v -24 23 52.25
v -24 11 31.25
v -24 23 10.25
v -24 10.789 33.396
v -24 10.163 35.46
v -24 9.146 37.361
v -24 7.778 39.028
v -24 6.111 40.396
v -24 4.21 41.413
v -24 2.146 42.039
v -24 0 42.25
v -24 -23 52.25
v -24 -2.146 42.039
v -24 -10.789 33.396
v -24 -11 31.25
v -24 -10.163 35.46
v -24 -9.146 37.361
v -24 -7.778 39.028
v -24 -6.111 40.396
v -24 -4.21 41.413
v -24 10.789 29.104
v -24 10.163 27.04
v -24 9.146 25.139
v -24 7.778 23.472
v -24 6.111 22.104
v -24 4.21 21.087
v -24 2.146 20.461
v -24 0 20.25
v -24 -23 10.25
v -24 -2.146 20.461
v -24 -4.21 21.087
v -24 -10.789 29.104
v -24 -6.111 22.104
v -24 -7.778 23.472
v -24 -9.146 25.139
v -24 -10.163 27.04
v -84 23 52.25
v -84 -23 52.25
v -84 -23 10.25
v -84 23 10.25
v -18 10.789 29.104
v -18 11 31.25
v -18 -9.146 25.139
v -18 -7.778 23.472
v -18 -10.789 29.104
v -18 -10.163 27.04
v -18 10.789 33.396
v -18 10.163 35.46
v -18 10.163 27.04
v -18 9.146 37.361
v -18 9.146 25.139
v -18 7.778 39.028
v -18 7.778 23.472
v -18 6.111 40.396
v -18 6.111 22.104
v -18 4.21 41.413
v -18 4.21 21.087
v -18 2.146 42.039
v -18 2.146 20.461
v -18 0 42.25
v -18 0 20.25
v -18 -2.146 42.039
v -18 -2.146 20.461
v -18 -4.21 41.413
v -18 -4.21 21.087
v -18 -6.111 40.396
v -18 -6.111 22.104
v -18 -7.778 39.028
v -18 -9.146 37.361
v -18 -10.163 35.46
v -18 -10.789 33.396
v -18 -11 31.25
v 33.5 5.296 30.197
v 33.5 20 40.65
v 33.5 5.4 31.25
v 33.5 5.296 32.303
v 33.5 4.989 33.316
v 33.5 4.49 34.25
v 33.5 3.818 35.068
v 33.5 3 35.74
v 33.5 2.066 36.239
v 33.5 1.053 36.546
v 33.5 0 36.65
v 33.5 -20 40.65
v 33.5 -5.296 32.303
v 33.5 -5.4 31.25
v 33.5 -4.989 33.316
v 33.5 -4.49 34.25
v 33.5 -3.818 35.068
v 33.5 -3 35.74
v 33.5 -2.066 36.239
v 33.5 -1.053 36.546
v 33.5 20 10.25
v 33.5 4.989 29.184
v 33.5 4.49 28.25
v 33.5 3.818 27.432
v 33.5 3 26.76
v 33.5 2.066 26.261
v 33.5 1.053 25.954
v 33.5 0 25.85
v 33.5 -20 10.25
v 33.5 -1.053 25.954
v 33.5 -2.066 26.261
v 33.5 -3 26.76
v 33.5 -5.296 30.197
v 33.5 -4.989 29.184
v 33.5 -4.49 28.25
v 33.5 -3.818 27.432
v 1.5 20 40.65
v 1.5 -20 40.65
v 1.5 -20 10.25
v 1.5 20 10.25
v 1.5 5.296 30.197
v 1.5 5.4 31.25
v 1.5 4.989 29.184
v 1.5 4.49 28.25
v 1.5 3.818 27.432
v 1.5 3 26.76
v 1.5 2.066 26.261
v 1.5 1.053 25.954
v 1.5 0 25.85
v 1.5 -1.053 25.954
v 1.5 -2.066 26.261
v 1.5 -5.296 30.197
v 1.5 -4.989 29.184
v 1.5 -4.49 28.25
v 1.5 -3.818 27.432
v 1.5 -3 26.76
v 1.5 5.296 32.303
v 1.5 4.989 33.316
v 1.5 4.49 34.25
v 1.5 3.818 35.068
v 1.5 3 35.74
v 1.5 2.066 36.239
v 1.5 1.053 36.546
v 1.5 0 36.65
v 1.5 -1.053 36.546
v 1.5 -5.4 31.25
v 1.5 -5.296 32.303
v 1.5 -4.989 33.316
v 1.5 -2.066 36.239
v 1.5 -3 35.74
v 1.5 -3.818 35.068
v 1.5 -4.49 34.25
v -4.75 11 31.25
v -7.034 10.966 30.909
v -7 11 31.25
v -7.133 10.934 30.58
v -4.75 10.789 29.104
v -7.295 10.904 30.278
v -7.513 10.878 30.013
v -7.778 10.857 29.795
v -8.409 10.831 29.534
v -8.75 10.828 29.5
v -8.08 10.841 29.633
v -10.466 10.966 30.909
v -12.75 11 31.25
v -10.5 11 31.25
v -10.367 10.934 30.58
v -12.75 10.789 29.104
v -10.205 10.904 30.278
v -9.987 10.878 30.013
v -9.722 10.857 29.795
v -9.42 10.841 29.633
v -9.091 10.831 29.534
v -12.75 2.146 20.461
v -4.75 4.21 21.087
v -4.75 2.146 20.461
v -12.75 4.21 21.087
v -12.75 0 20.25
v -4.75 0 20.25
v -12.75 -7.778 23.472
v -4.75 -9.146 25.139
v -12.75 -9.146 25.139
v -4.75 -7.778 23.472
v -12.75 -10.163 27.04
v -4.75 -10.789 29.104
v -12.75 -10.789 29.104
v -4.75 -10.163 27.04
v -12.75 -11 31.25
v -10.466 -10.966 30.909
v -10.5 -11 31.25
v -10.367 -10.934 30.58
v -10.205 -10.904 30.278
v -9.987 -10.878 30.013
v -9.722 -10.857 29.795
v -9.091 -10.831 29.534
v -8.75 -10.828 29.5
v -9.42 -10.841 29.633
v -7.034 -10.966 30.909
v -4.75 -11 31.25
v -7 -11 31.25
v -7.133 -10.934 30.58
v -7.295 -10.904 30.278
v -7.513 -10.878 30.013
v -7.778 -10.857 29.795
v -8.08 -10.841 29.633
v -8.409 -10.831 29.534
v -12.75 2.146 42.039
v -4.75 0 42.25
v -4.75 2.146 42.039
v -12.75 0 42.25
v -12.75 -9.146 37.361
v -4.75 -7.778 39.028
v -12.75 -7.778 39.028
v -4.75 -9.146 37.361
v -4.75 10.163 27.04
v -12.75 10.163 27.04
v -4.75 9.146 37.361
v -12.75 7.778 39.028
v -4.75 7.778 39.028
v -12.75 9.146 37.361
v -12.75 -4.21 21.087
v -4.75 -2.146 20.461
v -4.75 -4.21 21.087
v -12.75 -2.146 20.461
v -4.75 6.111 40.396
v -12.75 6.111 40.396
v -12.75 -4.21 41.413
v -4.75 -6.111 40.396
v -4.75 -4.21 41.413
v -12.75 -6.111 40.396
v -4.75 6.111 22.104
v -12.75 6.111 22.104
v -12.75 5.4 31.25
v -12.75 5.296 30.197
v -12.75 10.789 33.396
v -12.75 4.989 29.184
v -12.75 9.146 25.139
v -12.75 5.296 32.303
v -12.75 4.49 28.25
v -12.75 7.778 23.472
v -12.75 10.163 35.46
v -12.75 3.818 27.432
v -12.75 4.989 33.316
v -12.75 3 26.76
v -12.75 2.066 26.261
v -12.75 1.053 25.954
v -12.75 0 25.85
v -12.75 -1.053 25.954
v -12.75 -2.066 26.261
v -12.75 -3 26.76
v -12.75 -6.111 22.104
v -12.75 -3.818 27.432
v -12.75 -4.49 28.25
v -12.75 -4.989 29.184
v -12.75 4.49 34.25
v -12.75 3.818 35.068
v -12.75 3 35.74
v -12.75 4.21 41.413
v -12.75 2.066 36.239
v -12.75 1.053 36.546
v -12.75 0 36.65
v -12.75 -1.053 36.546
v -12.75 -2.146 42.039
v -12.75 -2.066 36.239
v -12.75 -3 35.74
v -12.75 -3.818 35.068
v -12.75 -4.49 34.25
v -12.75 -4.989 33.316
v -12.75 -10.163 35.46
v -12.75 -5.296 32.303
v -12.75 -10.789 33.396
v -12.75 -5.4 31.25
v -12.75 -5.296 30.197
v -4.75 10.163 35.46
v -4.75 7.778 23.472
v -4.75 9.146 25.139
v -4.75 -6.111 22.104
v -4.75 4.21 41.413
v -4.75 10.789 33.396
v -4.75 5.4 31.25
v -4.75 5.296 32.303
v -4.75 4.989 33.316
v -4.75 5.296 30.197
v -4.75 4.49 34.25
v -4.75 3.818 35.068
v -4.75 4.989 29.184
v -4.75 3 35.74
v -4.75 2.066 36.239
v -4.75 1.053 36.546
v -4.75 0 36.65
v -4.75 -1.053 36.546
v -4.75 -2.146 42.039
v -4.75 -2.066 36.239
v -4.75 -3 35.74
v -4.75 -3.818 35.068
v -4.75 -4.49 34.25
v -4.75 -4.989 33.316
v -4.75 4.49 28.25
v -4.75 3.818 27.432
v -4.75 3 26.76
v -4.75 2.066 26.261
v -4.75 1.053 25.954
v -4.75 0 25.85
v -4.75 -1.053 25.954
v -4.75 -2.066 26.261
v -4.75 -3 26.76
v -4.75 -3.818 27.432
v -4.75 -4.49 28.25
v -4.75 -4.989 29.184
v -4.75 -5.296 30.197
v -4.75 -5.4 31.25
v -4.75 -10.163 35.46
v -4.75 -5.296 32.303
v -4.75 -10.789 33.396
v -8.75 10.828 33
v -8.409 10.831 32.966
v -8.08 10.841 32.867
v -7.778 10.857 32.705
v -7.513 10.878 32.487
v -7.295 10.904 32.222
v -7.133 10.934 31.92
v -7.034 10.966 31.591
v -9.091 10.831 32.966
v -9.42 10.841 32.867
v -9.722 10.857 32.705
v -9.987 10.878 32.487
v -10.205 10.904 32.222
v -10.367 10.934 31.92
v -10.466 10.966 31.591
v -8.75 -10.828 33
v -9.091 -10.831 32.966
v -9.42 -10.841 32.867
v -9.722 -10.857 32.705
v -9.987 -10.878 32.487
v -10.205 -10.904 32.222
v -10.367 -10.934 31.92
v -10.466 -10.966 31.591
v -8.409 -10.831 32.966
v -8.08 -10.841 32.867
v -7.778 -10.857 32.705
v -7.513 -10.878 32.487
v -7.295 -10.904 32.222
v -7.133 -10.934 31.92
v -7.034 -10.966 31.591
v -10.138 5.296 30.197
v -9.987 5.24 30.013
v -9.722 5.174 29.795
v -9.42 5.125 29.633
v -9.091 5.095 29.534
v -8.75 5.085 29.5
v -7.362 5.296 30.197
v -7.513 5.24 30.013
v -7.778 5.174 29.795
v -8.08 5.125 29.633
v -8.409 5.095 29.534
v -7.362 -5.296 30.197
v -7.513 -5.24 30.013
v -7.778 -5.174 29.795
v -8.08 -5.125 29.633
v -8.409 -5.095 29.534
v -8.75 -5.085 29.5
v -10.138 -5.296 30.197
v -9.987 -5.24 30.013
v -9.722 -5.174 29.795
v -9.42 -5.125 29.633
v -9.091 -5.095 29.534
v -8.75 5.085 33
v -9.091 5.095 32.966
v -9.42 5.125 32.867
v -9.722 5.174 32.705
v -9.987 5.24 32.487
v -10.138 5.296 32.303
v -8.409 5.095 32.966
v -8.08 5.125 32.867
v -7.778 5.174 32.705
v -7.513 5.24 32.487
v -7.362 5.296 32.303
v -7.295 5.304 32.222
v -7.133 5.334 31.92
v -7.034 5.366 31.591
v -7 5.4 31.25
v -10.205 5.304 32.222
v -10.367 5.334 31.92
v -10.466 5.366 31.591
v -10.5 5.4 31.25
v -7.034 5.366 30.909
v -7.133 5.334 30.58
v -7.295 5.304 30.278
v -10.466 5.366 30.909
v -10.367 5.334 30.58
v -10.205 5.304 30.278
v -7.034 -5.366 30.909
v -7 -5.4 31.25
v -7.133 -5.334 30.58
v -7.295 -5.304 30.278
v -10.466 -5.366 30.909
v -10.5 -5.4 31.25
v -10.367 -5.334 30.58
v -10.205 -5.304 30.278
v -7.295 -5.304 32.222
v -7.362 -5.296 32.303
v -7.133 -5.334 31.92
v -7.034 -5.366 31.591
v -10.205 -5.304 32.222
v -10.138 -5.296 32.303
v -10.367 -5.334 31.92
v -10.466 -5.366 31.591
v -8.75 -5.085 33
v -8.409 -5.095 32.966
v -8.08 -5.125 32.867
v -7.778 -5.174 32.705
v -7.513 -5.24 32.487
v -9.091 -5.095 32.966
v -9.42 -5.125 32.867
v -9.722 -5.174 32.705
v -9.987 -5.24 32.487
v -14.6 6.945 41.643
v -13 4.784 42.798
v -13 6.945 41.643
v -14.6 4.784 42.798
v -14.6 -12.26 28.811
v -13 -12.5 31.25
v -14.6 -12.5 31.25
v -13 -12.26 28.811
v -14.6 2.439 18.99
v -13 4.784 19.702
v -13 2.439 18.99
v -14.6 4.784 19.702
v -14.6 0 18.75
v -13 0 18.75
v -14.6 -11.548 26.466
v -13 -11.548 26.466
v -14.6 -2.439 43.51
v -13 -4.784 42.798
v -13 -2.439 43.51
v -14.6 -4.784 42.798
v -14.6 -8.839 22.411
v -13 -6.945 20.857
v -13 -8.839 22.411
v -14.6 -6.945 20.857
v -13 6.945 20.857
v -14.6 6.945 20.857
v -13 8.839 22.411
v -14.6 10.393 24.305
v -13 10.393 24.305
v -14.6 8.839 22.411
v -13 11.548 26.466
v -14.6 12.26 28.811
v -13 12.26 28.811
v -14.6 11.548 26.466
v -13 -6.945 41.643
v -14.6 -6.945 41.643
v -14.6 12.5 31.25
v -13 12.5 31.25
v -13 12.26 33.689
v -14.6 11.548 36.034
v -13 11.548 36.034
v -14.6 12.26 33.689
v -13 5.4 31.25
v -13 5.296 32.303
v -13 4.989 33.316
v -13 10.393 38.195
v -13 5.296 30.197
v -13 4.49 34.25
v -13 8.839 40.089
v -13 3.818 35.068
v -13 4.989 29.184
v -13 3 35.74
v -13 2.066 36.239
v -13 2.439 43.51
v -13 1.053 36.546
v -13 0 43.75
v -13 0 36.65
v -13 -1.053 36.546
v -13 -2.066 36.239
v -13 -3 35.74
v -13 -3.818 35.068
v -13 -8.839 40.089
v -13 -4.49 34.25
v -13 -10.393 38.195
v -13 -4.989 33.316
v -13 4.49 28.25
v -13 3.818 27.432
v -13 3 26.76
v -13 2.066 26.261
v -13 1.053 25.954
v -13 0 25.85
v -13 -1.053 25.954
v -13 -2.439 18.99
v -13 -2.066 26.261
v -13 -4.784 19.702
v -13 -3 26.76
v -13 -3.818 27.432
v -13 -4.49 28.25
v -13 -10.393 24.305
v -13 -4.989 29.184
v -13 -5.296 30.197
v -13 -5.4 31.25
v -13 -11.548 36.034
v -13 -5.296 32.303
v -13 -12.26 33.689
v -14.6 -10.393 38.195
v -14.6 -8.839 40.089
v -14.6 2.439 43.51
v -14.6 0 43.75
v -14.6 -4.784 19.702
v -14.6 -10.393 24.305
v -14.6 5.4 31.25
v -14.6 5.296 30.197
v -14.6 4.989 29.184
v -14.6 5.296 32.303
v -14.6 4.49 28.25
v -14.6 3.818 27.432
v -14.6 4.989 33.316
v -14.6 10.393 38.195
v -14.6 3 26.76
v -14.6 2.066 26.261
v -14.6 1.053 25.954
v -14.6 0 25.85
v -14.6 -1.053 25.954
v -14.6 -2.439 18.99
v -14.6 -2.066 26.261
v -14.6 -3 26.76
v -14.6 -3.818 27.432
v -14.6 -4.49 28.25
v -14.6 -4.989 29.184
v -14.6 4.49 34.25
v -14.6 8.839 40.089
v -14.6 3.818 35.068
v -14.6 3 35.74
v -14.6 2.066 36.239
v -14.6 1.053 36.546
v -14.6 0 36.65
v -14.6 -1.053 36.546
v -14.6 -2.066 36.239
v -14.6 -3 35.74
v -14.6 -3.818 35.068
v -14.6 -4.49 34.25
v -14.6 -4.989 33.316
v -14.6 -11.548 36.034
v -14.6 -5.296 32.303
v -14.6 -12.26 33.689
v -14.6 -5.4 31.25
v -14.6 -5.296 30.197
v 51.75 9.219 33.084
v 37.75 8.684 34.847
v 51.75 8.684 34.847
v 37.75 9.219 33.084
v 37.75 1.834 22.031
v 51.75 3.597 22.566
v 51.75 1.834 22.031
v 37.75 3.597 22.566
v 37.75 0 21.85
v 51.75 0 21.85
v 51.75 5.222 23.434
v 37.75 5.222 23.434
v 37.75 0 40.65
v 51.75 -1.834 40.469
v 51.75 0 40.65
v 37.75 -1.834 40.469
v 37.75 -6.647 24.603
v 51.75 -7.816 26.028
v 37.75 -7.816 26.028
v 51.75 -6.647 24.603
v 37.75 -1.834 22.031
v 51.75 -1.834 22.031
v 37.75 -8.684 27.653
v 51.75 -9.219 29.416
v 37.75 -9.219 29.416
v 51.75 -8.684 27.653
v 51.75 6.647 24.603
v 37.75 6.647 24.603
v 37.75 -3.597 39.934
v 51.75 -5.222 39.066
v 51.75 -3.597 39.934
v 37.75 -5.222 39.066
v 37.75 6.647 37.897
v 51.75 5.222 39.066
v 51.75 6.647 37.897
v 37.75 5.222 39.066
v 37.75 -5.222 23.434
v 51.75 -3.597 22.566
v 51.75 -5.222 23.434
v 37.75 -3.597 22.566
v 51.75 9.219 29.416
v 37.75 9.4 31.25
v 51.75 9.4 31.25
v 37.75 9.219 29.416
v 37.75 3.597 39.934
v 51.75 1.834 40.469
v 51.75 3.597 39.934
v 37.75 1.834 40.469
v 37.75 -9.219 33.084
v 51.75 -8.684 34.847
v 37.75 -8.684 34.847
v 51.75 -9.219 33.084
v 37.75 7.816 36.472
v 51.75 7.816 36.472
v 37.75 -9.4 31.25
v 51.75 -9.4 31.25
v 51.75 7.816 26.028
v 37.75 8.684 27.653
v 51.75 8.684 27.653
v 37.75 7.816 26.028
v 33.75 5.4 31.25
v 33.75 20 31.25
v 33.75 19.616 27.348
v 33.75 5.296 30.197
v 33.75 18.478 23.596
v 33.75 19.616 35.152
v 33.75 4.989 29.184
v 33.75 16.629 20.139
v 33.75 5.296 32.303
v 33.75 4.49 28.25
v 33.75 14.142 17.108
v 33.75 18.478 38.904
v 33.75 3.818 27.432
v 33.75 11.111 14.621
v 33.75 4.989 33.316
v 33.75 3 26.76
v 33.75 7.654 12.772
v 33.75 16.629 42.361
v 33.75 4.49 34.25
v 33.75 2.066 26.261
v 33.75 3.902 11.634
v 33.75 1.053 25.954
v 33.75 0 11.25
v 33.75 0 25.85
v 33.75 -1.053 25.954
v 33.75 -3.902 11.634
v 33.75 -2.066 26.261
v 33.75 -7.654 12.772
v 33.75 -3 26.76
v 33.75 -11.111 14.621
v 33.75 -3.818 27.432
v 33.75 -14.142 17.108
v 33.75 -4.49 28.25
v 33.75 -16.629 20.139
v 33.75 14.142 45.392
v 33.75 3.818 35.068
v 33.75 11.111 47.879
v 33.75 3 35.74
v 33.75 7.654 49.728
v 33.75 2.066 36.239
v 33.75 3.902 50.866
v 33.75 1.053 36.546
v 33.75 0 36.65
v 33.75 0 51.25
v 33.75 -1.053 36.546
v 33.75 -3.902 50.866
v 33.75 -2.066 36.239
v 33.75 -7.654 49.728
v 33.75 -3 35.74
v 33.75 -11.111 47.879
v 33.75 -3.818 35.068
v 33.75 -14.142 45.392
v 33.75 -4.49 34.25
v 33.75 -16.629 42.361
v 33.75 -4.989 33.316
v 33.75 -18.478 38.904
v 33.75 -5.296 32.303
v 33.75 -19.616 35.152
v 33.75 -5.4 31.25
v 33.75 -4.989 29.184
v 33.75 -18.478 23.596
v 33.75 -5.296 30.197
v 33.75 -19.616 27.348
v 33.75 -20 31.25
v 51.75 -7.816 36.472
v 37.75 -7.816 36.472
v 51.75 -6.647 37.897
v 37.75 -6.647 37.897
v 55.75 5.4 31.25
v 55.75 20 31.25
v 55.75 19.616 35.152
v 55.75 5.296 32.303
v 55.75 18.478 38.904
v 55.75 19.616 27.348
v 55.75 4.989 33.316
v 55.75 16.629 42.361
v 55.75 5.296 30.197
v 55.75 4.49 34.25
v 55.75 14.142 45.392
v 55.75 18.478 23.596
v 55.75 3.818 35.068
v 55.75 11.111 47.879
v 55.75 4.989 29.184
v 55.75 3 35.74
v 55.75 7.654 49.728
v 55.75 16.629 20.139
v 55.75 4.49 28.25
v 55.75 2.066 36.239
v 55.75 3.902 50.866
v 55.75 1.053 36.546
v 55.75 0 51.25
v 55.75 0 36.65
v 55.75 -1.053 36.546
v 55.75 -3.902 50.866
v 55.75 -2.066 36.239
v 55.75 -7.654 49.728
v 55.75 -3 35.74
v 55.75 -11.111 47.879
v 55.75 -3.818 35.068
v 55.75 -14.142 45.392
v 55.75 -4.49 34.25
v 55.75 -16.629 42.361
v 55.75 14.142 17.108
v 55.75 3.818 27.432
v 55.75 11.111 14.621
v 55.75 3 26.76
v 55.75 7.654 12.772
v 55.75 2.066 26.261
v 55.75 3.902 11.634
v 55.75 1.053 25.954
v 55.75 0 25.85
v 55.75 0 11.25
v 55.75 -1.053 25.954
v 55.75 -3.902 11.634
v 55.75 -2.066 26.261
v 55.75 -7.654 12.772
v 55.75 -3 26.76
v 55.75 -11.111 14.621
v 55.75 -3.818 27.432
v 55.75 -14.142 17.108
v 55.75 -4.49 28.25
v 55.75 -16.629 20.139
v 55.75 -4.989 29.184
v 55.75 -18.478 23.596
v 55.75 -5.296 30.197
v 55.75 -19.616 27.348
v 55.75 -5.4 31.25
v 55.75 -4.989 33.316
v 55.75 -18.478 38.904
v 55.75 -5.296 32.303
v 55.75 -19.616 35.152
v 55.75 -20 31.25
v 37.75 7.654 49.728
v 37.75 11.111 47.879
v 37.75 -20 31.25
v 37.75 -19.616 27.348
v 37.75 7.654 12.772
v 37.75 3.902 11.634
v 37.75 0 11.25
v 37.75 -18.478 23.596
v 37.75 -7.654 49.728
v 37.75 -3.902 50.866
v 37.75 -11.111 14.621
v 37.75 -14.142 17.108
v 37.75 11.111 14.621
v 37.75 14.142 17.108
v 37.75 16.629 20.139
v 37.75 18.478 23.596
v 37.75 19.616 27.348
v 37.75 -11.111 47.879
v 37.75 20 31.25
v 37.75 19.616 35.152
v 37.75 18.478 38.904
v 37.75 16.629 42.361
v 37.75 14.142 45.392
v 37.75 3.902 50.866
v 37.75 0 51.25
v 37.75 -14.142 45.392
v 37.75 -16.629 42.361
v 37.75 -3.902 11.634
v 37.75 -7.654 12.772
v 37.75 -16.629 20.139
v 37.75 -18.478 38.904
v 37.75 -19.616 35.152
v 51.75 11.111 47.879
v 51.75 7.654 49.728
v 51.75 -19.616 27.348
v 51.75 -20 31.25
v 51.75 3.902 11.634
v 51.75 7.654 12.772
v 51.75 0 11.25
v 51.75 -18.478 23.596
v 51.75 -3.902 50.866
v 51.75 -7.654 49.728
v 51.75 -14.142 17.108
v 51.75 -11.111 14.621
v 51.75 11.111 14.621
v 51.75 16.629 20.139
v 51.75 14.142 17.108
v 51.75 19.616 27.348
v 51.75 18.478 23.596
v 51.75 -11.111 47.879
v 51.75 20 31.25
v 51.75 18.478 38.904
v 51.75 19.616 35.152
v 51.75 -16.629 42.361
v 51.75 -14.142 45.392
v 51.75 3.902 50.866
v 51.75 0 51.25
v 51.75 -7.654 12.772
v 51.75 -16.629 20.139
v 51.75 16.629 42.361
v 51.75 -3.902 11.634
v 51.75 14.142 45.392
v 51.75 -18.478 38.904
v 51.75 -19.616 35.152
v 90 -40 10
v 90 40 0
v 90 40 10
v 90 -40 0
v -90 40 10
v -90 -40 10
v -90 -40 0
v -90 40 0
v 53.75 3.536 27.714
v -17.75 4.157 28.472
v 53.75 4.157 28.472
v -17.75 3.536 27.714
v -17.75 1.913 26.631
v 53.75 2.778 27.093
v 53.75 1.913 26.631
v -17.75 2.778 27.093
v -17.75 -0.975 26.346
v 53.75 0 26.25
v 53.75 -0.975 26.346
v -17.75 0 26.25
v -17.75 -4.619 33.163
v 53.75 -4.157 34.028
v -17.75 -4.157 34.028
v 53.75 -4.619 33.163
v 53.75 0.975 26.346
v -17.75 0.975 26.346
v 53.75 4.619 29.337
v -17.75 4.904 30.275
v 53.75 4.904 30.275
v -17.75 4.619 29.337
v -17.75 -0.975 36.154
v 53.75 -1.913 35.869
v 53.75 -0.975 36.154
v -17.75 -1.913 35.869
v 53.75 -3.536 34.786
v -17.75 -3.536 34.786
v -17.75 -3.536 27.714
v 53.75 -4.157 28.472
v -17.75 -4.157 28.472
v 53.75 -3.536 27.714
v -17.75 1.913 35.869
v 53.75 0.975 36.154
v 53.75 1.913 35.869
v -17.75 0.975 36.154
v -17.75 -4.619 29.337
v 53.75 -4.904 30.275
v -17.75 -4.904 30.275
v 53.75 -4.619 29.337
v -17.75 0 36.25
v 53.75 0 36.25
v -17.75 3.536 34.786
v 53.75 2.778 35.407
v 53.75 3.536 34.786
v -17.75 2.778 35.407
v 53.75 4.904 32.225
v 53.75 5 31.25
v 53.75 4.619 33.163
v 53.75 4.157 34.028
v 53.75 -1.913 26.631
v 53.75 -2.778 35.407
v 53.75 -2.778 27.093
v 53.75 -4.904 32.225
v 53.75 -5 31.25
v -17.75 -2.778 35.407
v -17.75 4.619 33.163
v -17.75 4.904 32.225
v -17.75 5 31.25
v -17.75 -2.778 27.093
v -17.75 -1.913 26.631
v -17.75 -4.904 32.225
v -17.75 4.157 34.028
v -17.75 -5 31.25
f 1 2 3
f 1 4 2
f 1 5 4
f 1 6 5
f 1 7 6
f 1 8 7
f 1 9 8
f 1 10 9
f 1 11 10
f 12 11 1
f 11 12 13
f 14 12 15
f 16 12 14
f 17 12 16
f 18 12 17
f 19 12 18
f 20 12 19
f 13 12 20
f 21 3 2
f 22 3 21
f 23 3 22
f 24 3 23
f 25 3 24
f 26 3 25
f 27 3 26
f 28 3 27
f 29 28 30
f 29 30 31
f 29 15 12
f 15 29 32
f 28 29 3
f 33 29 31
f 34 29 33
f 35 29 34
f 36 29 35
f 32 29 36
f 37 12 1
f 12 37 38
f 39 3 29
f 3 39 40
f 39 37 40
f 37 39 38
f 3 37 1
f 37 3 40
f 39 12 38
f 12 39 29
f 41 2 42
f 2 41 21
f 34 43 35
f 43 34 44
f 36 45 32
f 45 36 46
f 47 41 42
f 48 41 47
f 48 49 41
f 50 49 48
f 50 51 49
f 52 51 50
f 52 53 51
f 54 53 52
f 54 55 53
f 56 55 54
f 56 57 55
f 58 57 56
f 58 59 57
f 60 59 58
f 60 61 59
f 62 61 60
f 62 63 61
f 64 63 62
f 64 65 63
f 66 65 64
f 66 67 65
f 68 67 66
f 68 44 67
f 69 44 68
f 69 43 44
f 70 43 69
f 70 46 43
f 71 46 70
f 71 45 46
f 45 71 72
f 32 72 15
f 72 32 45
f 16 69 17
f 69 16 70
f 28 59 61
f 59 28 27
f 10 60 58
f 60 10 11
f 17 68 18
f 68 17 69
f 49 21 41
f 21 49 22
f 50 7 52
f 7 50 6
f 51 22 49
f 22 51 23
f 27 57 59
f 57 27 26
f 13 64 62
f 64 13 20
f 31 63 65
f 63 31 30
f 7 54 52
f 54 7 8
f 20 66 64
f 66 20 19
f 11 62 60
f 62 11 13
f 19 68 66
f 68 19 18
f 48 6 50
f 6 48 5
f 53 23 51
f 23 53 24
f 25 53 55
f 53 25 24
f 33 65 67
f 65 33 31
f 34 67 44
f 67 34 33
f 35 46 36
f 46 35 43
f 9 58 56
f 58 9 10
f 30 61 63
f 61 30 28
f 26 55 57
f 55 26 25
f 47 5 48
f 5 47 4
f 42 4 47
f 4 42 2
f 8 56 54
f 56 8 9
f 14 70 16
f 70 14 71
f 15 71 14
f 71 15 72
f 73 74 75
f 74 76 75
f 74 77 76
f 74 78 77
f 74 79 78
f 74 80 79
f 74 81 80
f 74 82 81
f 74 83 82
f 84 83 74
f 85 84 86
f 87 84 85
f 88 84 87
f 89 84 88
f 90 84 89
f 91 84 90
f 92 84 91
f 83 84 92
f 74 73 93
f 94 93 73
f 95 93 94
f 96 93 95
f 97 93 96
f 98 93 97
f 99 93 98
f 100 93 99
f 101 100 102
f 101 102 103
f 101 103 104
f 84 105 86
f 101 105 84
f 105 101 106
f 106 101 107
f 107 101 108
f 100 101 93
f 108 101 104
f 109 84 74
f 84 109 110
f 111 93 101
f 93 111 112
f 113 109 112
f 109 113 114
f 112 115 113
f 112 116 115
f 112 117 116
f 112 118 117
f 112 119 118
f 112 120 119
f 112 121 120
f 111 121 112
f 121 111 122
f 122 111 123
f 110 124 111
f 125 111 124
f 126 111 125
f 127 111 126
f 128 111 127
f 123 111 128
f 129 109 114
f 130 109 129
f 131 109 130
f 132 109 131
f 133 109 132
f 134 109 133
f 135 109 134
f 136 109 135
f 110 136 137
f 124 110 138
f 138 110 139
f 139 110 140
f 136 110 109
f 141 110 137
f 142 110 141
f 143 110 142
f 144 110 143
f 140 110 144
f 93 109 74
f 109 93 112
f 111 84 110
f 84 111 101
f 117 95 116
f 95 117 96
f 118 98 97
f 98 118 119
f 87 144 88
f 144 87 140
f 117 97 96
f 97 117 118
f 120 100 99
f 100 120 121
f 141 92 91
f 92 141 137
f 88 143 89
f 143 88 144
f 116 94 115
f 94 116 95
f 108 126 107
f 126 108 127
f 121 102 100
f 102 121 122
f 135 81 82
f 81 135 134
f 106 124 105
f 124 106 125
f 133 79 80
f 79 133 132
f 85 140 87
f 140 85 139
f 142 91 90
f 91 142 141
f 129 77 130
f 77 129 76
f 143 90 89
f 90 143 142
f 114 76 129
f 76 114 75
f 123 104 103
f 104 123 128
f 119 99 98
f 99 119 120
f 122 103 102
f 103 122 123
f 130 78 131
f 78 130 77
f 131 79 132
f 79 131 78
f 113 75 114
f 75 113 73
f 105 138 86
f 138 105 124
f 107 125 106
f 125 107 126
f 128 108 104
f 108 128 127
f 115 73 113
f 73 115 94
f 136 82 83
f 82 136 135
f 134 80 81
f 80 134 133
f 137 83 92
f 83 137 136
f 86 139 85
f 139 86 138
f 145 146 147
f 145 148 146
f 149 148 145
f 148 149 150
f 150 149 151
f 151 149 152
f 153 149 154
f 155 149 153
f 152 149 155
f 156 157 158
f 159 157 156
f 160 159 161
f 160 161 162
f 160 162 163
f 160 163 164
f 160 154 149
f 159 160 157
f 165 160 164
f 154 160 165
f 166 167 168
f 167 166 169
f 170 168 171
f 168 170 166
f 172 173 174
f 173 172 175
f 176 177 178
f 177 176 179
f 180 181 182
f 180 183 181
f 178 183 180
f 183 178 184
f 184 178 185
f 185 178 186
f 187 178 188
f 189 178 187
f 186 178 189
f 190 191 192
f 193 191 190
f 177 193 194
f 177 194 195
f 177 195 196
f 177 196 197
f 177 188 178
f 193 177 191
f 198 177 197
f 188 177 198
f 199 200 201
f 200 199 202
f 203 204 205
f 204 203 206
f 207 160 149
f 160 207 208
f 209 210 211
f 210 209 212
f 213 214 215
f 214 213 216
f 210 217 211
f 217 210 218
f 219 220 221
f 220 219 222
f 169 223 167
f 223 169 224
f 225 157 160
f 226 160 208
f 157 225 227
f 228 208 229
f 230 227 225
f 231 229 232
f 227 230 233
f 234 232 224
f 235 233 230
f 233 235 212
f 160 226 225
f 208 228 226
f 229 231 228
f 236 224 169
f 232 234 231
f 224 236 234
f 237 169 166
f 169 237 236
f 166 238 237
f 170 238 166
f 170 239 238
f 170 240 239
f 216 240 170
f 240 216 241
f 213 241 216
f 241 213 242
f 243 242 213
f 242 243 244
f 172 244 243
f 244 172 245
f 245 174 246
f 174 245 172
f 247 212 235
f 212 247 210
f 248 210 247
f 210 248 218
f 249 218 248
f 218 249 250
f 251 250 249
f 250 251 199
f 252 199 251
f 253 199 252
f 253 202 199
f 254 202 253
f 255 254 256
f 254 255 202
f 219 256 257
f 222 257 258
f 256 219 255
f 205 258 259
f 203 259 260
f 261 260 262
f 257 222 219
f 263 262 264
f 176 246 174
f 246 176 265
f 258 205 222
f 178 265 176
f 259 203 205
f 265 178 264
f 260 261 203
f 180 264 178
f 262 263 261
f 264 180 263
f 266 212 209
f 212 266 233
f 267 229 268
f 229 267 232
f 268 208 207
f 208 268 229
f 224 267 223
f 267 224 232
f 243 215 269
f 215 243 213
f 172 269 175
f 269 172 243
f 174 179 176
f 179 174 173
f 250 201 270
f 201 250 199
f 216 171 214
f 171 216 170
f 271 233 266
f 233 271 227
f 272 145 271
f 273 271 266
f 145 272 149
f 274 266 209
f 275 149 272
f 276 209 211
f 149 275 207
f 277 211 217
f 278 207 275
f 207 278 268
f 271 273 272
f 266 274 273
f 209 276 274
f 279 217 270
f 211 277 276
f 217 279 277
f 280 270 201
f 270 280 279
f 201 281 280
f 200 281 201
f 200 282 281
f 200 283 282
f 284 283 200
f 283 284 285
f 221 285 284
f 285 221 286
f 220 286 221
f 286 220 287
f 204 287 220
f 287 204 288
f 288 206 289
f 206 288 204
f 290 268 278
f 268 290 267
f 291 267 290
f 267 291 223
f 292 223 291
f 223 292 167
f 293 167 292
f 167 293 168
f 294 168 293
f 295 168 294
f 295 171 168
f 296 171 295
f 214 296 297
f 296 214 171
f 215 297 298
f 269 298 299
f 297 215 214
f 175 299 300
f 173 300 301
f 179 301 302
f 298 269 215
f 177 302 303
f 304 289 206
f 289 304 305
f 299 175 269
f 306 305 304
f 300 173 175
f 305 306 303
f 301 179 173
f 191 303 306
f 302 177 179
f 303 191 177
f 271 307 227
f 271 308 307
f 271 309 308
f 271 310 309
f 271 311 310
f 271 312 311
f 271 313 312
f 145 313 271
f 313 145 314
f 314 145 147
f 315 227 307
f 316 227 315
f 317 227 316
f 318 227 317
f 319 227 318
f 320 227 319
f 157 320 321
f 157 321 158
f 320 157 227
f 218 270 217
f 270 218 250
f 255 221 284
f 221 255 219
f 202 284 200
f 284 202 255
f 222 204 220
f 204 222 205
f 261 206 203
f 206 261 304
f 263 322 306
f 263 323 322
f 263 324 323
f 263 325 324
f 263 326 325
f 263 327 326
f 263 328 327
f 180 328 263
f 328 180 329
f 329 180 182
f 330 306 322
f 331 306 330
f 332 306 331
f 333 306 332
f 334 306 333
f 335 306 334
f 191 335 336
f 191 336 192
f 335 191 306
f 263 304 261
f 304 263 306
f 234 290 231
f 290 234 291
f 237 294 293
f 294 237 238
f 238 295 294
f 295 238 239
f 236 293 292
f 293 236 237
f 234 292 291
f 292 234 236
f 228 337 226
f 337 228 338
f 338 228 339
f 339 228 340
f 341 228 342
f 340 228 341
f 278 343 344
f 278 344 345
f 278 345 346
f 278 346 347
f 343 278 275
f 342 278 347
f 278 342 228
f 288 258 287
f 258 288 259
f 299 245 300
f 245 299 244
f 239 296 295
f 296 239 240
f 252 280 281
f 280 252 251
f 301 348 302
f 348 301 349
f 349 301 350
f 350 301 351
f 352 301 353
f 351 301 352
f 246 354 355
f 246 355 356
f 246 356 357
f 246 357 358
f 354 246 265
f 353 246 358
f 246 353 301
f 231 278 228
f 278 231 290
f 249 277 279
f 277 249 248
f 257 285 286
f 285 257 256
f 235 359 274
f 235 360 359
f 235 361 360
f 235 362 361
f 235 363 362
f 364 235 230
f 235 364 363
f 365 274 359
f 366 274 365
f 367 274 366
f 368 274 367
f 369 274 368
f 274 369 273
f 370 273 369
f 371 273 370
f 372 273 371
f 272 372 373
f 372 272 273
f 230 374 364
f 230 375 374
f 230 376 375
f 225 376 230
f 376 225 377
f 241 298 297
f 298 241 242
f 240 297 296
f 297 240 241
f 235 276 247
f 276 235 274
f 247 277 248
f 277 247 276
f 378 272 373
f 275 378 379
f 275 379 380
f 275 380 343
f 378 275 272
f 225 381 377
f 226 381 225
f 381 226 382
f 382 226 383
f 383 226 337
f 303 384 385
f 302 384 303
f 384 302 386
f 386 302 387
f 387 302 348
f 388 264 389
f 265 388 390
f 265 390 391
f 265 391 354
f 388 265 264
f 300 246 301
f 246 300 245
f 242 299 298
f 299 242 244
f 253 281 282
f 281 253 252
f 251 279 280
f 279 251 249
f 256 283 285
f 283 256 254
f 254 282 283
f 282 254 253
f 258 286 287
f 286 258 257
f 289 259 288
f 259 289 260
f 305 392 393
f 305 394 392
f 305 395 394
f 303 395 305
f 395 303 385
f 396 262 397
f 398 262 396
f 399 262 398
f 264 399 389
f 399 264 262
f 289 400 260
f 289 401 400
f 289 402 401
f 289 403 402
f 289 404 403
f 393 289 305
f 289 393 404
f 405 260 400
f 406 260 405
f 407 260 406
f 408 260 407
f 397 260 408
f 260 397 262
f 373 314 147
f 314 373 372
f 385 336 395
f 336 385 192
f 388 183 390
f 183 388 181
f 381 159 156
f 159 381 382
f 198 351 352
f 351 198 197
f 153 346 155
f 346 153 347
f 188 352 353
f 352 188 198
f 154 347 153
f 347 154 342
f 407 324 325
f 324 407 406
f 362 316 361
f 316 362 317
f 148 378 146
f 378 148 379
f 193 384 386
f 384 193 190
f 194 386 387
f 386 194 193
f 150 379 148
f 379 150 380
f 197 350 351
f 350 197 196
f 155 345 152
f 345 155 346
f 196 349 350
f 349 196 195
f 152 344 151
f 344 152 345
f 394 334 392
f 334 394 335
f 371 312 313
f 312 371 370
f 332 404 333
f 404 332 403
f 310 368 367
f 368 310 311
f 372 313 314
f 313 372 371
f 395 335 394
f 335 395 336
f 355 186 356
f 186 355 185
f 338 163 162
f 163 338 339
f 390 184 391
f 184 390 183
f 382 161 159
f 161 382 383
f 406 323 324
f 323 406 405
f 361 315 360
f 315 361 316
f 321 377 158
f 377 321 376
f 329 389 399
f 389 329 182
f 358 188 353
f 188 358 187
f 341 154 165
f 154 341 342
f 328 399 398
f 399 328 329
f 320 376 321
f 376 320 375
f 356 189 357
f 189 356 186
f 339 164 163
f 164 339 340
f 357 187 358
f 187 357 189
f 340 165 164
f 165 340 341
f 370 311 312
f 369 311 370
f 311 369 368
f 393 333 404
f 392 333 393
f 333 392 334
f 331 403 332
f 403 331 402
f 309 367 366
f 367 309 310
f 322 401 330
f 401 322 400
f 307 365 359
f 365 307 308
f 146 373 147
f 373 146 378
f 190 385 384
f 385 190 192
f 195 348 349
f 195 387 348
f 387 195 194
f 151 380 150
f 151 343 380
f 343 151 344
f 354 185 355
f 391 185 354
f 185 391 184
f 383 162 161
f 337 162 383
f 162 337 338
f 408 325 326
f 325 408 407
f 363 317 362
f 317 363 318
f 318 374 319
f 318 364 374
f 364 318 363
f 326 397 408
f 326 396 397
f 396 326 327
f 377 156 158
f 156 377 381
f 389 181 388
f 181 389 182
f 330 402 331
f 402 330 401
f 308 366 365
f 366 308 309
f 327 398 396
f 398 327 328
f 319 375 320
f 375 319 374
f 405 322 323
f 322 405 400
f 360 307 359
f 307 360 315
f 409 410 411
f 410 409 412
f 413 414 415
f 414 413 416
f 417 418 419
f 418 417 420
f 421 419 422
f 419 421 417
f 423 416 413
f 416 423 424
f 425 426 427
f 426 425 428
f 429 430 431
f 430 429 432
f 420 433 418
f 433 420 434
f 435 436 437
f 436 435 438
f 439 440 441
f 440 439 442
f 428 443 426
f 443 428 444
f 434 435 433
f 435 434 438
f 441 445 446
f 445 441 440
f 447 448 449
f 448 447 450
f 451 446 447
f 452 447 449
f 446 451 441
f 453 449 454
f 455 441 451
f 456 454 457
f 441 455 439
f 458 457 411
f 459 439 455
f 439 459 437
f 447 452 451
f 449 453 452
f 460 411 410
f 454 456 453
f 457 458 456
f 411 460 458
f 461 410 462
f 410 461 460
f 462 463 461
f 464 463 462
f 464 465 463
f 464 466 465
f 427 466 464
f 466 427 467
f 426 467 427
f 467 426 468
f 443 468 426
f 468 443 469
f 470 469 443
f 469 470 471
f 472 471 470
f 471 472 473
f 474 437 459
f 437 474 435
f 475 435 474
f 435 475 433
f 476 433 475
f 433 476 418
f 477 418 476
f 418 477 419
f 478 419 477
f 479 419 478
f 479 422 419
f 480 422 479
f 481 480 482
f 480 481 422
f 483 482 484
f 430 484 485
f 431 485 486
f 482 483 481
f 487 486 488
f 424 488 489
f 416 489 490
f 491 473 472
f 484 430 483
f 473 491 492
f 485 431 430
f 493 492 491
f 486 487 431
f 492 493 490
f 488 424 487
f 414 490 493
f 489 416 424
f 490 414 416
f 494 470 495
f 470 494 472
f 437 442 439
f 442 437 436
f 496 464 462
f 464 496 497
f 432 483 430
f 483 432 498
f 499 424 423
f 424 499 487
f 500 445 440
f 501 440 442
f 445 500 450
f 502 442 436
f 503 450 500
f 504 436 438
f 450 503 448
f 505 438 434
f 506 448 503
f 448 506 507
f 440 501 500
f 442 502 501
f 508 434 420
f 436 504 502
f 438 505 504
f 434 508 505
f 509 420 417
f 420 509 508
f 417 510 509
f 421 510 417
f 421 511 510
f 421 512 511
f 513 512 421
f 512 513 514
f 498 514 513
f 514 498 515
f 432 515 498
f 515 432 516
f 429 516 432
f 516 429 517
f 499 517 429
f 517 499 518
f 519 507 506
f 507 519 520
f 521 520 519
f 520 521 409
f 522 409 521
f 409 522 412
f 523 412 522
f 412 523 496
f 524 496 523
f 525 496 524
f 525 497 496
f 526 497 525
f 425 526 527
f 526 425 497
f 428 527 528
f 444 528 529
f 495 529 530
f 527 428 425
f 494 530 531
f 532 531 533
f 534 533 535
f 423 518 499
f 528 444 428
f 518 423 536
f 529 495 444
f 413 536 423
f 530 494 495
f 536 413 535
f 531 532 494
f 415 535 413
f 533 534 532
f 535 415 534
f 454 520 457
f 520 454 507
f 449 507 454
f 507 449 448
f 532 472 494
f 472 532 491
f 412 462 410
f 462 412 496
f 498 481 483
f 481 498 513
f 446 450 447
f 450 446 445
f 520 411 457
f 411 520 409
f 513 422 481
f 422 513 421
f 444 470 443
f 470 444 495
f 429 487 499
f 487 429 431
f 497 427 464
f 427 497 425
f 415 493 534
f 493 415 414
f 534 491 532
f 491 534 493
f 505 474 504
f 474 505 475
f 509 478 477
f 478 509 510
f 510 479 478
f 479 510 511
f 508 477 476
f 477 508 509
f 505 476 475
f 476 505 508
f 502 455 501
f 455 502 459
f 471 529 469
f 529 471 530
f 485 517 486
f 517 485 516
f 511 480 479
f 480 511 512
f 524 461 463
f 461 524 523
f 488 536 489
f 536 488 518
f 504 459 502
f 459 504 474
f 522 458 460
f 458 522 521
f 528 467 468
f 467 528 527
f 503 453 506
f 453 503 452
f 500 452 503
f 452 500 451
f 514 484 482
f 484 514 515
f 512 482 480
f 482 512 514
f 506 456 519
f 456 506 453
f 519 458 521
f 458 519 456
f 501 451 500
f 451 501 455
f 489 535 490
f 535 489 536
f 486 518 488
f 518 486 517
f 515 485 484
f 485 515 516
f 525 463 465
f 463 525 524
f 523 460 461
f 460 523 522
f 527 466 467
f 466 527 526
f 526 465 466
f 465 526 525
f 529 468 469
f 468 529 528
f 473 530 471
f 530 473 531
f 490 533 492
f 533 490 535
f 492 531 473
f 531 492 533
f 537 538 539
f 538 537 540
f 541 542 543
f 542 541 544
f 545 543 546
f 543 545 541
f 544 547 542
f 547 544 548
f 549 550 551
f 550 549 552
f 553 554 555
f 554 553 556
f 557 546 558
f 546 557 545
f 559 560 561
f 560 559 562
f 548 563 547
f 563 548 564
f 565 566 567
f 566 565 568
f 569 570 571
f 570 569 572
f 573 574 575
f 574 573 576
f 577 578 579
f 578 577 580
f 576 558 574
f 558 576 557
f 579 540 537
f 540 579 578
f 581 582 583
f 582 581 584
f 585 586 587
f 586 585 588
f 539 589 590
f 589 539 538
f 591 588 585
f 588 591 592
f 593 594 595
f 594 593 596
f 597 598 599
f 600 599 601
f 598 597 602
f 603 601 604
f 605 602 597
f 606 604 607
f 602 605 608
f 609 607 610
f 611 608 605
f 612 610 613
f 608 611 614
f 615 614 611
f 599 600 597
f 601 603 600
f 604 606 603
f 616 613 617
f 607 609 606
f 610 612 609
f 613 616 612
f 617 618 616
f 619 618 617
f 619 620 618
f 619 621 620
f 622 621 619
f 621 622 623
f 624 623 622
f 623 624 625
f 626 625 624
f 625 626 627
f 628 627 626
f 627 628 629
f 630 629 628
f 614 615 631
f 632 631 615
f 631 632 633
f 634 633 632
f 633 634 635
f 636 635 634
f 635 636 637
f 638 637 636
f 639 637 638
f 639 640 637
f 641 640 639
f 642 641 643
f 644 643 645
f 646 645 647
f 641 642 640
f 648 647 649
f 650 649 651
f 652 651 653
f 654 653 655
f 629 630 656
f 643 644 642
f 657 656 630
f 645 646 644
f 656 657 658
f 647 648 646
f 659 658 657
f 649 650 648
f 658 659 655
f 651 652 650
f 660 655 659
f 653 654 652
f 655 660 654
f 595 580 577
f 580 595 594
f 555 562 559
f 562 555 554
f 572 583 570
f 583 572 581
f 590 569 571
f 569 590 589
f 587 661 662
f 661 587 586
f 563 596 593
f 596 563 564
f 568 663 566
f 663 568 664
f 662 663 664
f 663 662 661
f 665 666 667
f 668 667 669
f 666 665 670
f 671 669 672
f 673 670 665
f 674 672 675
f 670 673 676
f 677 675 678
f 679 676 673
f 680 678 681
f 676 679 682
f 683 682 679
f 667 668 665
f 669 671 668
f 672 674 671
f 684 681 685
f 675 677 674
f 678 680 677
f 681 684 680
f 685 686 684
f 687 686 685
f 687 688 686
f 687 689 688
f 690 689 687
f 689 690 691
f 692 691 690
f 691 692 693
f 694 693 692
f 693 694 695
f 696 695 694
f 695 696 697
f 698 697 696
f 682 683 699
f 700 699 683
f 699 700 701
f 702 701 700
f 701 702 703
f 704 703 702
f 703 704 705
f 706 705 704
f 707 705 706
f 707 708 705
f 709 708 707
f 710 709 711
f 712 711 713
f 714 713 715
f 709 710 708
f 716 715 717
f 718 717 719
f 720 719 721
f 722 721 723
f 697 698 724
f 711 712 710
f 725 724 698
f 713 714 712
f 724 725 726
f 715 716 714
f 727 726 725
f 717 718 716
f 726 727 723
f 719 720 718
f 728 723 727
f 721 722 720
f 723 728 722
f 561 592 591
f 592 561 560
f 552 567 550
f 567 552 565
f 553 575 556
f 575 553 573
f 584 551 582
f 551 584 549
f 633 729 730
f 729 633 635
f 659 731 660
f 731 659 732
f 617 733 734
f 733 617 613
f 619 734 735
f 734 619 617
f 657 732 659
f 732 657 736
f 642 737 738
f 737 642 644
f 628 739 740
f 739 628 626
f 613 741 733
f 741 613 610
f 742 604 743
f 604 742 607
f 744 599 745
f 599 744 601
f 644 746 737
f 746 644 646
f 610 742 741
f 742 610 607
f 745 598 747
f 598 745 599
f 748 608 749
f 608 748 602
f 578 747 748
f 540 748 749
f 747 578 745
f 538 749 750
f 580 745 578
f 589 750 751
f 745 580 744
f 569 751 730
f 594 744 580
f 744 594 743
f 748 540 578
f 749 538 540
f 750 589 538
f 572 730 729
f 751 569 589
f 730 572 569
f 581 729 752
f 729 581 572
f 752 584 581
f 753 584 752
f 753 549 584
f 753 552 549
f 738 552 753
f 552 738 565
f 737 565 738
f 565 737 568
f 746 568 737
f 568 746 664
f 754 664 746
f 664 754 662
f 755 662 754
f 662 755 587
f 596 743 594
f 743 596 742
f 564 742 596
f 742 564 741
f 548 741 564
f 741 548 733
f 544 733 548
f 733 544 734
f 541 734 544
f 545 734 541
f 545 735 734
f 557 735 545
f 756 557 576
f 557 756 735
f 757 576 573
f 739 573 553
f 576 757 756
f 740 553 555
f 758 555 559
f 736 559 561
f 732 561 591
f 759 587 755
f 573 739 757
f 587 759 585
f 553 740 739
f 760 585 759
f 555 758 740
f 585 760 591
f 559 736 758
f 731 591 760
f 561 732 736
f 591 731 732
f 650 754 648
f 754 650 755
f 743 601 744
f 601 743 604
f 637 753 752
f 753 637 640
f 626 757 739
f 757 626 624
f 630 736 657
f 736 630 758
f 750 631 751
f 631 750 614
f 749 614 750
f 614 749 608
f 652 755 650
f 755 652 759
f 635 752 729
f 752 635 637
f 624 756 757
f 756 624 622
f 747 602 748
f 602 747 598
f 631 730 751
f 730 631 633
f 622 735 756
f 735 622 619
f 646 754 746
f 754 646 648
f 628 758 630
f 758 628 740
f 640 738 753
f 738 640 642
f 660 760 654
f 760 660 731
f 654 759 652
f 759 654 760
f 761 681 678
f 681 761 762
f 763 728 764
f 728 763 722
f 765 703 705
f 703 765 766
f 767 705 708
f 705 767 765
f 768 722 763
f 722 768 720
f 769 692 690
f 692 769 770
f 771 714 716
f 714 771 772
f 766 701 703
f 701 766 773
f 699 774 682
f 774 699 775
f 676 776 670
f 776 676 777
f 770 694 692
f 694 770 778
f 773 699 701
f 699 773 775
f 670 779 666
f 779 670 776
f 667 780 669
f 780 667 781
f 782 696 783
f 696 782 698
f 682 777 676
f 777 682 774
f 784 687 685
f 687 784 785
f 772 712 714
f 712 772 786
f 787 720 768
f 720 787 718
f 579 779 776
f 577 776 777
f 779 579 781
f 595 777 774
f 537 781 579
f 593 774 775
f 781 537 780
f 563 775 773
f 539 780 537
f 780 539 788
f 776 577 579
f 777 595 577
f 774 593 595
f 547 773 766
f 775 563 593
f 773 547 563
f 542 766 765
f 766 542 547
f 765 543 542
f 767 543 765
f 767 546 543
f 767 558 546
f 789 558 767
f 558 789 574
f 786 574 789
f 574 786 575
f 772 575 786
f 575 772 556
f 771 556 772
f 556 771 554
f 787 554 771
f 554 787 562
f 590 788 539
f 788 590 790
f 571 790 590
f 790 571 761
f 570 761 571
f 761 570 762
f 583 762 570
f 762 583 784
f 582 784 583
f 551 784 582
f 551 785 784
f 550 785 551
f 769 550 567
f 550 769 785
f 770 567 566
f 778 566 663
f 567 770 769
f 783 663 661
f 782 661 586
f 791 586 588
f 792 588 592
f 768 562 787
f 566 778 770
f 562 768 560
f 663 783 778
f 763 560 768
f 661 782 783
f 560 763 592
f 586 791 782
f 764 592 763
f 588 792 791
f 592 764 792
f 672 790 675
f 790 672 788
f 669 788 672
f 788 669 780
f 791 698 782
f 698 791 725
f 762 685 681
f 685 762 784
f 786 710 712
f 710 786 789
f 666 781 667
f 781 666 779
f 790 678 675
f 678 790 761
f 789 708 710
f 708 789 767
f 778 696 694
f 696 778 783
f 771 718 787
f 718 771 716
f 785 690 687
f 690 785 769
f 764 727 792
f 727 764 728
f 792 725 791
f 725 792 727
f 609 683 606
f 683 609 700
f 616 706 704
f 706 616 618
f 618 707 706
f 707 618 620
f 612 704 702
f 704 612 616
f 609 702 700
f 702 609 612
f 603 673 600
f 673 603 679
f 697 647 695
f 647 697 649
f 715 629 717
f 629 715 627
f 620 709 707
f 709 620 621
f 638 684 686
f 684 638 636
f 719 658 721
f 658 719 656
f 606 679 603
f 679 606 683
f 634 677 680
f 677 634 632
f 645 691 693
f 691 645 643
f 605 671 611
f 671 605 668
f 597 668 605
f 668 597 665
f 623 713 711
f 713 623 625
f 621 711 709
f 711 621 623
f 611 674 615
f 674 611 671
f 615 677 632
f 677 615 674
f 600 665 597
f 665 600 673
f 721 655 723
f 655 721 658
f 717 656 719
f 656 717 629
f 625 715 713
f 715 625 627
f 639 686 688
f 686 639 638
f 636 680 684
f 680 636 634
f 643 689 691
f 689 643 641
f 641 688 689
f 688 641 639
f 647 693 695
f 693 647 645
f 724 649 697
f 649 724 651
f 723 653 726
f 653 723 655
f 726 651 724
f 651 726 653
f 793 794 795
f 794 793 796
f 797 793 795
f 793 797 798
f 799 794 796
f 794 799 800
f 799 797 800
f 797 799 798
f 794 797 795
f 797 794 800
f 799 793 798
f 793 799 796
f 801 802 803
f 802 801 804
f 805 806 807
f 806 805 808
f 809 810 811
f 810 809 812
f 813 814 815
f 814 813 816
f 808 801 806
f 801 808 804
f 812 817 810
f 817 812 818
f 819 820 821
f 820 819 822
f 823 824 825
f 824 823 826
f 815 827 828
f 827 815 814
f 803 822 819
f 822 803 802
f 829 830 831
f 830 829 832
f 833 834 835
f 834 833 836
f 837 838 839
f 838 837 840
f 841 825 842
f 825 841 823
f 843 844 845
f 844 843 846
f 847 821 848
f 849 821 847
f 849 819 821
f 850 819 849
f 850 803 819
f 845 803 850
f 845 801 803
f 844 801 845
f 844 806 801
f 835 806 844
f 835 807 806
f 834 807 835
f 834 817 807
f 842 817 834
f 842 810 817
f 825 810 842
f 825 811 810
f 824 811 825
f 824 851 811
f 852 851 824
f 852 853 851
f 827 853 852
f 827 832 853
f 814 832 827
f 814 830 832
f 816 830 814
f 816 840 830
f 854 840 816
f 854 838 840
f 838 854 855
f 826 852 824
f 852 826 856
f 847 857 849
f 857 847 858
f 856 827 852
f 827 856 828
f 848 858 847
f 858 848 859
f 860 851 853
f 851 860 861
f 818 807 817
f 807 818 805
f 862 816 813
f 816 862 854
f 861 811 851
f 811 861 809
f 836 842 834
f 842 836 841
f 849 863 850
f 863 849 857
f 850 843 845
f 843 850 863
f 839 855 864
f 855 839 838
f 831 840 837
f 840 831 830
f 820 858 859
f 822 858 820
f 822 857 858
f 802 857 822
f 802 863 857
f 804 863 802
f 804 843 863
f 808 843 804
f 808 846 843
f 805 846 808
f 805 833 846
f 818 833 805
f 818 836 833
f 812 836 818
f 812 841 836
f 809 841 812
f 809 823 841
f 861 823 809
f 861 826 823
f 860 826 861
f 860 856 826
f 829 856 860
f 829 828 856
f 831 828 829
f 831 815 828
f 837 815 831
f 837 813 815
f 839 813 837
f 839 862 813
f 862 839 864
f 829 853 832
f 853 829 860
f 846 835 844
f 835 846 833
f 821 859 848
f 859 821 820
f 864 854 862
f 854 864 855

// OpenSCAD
$fn = 32;

// ------------------------------------------------------------------------
// Motor drive station: motor 60 x 42 mm, shaft d10, pulley d40
// Every part is its own module, assembly() places every instance.
// ------------------------------------------------------------------------

// --- part 1 ---
module station_bed() {
  difference() {
    translate([-90, -40, 0]) cube([180, 80, 10]);
  }
}

// --- part 2 ---
module drive_motor() {
  union() {
    translate([-30, -23, 0]) cube([60, 46, 42]);
    translate([33, 0, 21]) rotate([0, 90, 0]) cylinder(h = 6, d = 22, center = true);
  }
}

// --- part 3 ---
module pillow_block() {
  difference() {
    translate([-16, -20, 0]) cube([32, 40, 30.4]);
    translate([0, 0, 21]) rotate([0, 90, 0]) cylinder(h = 34, d = 10.8, center = true);
  }
}

// --- part 4 ---
module drive_shaft() {
  translate([0, 0, -35.75]) cylinder(h = 71.5, d = 10);
}

// --- part 5 ---
module shaft_collar() {
  difference() {
    cylinder(h = 8, d = 22);
    translate([0, 0, -1]) cylinder(h = 10, d = 10.8);
    translate([0, 0, 4]) rotate([90, 0, 0]) cylinder(h = 24, d = 3.5, center = true);
  }
}

// --- part 6 ---
module collar_washer() {
  difference() {
      translate([0, 0, 0]) cylinder(h = 1.6, d = 25);
      translate([0, 0, -1]) cylinder(h = 3.6, d = 10.8);
    }
}

// --- part 7 ---
module drive_pulley() {
  difference() {
    union() {
      cylinder(h = 22, d = 18.8);
      cylinder(h = 4, d = 40);
      translate([0, 0, 18]) cylinder(h = 4, d = 40);
    }
    translate([0, 0, -1]) cylinder(h = 24, d = 10.8);
  }
}

// --- assembly ---
module assembly() {
  color([0.80, 0.24, 0.20]) translate([0, 0, 0]) rotate([0, 0, 0]) station_bed();
  color([0.20, 0.45, 0.75]) translate([-54, 0, 10.25]) rotate([0, 0, 0]) drive_motor();
  color([0.25, 0.62, 0.32]) translate([17.5, 0, 10.25]) rotate([0, 0, 0]) pillow_block();
  color([0.92, 0.70, 0.18]) translate([18, 0, 31.25]) rotate([0, 90, 0]) drive_shaft();
  color([0.58, 0.35, 0.70]) translate([-12.75, 0, 31.25]) rotate([0, 90, 0]) shaft_collar();
  color([0.16, 0.66, 0.66]) translate([-14.6, 0, 31.25]) rotate([0, 90, 0]) collar_washer();
  color([0.85, 0.48, 0.18]) translate([33.75, 0, 31.25]) rotate([0, 90, 0]) drive_pulley();
}

assembly();
